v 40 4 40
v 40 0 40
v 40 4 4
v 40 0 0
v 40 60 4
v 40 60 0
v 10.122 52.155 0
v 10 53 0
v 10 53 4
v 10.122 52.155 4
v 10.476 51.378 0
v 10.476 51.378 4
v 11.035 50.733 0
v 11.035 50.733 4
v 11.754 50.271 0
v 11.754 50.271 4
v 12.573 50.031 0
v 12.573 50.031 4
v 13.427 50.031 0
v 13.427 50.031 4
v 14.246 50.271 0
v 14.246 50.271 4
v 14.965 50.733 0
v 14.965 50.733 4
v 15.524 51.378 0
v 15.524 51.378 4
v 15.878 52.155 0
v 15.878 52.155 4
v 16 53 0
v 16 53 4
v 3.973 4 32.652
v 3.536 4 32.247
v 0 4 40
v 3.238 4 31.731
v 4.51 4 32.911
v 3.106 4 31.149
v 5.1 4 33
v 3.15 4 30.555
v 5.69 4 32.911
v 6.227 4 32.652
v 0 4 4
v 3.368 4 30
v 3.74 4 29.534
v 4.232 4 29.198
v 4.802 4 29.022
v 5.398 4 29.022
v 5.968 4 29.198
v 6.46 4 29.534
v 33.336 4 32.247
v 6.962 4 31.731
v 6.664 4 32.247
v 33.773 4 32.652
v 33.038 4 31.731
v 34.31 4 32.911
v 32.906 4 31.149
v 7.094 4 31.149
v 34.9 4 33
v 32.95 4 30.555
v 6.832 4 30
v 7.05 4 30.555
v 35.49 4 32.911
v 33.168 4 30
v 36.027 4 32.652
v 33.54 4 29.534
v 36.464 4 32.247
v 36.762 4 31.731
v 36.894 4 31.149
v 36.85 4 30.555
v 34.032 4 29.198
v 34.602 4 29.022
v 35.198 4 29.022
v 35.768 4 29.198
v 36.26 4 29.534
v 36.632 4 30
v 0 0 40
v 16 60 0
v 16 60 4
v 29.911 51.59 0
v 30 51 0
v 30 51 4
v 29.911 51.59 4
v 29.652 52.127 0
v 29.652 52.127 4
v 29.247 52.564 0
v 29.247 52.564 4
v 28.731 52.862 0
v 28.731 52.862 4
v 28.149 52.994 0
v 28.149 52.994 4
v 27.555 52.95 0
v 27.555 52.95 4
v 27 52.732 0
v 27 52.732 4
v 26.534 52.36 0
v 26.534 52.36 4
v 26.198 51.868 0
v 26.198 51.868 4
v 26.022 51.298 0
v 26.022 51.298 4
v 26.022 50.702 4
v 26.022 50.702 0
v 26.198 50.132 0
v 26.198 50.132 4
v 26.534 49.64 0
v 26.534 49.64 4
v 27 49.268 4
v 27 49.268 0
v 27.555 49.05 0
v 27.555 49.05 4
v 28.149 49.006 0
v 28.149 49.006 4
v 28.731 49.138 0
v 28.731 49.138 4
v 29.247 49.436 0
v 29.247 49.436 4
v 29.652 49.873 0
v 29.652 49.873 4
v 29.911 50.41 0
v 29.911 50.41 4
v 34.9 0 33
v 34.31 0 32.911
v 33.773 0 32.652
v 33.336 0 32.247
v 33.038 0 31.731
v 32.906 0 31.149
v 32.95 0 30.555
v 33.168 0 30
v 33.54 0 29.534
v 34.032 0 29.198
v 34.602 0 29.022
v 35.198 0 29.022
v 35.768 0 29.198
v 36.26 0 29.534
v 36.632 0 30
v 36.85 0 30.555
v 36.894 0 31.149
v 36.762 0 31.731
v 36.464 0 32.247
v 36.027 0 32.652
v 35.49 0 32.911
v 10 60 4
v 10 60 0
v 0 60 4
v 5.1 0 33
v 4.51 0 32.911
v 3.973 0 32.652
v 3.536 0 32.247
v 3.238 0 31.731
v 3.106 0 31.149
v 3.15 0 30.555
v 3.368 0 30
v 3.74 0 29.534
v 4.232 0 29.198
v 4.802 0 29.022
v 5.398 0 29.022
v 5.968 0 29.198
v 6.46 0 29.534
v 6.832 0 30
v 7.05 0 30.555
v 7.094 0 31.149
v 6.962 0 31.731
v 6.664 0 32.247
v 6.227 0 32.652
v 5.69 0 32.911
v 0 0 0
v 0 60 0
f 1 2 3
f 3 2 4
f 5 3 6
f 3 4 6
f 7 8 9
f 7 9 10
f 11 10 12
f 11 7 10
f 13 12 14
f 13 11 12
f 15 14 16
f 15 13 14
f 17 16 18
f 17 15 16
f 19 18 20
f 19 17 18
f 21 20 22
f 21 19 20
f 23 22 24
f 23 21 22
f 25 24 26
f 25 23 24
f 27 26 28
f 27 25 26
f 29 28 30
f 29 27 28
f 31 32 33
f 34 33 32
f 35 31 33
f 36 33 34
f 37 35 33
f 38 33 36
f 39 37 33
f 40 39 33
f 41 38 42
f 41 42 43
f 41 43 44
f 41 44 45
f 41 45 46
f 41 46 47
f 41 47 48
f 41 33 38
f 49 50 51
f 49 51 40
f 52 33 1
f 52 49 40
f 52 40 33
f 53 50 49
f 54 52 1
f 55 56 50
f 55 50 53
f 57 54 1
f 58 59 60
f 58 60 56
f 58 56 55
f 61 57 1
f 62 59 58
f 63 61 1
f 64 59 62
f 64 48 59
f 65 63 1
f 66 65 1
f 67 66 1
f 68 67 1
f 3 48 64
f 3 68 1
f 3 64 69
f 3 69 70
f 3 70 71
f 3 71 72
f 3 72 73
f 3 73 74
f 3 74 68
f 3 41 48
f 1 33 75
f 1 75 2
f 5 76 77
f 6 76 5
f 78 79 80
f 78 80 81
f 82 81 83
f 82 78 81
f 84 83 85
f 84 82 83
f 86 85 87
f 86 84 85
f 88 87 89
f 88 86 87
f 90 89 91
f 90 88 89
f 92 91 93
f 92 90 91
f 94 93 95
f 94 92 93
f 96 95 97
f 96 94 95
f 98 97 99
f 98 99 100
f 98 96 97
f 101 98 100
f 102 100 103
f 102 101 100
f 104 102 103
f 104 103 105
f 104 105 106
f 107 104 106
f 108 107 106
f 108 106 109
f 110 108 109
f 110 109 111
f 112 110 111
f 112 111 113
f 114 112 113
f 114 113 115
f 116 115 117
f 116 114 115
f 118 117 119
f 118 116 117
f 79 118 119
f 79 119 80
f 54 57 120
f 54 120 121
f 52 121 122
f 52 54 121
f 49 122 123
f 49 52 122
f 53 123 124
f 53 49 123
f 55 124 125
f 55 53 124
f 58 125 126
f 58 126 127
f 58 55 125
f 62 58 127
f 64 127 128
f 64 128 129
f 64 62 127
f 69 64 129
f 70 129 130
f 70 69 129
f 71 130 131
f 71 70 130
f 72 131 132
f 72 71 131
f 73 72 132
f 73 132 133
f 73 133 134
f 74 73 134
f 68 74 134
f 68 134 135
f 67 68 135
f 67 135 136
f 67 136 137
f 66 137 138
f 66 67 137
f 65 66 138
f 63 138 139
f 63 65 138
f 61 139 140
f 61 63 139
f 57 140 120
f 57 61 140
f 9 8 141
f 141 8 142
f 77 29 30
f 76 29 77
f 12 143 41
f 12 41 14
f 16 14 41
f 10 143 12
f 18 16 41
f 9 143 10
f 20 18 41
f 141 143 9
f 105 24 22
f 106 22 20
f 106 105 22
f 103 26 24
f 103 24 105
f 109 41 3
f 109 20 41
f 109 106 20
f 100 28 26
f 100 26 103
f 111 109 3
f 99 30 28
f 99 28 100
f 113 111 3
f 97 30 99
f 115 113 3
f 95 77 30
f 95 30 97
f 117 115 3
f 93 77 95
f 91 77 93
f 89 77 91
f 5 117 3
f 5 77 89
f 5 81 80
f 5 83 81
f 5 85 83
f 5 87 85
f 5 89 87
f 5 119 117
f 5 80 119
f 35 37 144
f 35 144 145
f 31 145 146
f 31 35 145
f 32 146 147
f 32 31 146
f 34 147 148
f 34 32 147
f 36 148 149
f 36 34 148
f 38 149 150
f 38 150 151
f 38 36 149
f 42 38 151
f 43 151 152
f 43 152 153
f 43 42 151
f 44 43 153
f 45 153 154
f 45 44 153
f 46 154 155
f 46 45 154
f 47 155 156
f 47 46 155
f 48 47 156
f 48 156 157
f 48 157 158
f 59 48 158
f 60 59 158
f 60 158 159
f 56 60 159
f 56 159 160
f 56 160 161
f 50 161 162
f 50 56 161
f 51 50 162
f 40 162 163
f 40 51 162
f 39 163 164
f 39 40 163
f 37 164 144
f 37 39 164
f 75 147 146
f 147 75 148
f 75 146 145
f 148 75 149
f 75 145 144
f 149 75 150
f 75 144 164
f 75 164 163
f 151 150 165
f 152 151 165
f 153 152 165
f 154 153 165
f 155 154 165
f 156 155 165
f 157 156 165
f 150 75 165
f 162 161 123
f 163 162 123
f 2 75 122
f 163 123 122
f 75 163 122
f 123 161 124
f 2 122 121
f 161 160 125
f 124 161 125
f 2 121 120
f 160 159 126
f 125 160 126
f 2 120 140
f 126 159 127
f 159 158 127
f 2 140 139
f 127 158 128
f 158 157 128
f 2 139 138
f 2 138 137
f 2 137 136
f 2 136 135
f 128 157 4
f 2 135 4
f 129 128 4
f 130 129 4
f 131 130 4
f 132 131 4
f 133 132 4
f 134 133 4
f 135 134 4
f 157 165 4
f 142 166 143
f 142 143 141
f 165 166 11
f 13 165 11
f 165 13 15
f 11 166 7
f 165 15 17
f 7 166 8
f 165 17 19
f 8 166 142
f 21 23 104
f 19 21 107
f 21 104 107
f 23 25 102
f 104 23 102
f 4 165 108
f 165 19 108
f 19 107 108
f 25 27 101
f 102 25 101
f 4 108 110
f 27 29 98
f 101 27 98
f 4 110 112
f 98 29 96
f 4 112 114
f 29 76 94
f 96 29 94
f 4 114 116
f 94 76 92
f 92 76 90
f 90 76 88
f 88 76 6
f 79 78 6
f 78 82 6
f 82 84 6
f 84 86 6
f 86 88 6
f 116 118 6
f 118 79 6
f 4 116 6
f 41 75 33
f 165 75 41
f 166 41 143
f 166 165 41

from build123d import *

# Parameters (mm, degrees)
CYLINDER002_R     = 2
CYLINDER002_DEPTH = 4
CYLINDER003_R     = 3
CYLINDER003_DEPTH = 4
BOX002_W          = 6
BOX002_H          = 7
BOX002_DEPTH      = 4
CYLINDER_R        = 2
CYLINDER_DEPTH    = 4
CYLINDER001_R     = 2
CYLINDER001_DEPTH = 4
BOX_W             = 40
BOX_H             = 60
BOX_DEPTH         = 4
BOX001_W          = 40
BOX001_H          = 4
BOX001_DEPTH      = 40


with BuildPart() as agujero_de_sujeccion:
    # Cylinder002 → Cylinder002 (new body)
    with BuildSketch(Plane(origin=(28, 51, 0), x_dir=(1, 0, 0), z_dir=(0, 0, 1))):
        Circle(CYLINDER002_R)
    extrude(amount=CYLINDER002_DEPTH)


with BuildPart() as cilindro003:
    # Cylinder003 → Cylinder003 (new body)
    with BuildSketch(Plane(origin=(13, 53, 0), x_dir=(1, 0, 0), z_dir=(0, 0, 1))):
        Circle(CYLINDER003_R)
    extrude(amount=CYLINDER003_DEPTH)


with BuildPart() as agujero_de_sujeccion_del_hotend:
    # Box002 → Box002 (new body)
    with BuildSketch(Plane(origin=(10, 53, 0), x_dir=(1, 0, 0), z_dir=(0, 0, 1))):
        with Locations((3, 3.5)):
            Rectangle(BOX002_W, BOX002_H)
    extrude(amount=BOX002_DEPTH)

    # Fusion002: union Cilindro003
    add(cilindro003.part)


with BuildPart() as cylinder:
    # Cylinder → Cylinder (new body)
    with BuildSketch(Plane(origin=(5.1, 4, 31), x_dir=(0, 0, 1), z_dir=(0, -1, 0))):
        Circle(CYLINDER_R)
    extrude(amount=CYLINDER_DEPTH)


with BuildPart() as agujeros_roscados_m4:
    # Cylinder001 → Cylinder001 (new body)
    with BuildSketch(Plane(origin=(34.9, 4, 31), x_dir=(0, 0, 1), z_dir=(0, -1, 0))):
        Circle(CYLINDER001_R)
    extrude(amount=CYLINDER001_DEPTH)

    # Fusion001: union Cylinder
    add(cylinder.part)


with BuildPart() as cubo:
    # Box → Box (new body)
    with BuildSketch(Plane.XY):
        with Locations((20, 30)):
            Rectangle(BOX_W, BOX_H)
    extrude(amount=BOX_DEPTH)


with BuildPart() as soporte_extrusor:
    # Box001 → Box001 (new body)
    with BuildSketch(Plane.XY):
        with Locations((20, 2)):
            Rectangle(BOX001_W, BOX001_H)
    extrude(amount=BOX001_DEPTH)

    # Fusion: union Cubo
    add(cubo.part)

    # Cut: cut Agujeros roscados M4
    add(agujeros_roscados_m4.part, mode=Mode.SUBTRACT)

    # Cut001: cut Agujero de sujeccion del hotend
    add(agujero_de_sujeccion_del_hotend.part, mode=Mode.SUBTRACT)

    # Cut002: cut agujero de sujeccion
    add(agujero_de_sujeccion.part, mode=Mode.SUBTRACT)


solid = soporte_extrusor.part
